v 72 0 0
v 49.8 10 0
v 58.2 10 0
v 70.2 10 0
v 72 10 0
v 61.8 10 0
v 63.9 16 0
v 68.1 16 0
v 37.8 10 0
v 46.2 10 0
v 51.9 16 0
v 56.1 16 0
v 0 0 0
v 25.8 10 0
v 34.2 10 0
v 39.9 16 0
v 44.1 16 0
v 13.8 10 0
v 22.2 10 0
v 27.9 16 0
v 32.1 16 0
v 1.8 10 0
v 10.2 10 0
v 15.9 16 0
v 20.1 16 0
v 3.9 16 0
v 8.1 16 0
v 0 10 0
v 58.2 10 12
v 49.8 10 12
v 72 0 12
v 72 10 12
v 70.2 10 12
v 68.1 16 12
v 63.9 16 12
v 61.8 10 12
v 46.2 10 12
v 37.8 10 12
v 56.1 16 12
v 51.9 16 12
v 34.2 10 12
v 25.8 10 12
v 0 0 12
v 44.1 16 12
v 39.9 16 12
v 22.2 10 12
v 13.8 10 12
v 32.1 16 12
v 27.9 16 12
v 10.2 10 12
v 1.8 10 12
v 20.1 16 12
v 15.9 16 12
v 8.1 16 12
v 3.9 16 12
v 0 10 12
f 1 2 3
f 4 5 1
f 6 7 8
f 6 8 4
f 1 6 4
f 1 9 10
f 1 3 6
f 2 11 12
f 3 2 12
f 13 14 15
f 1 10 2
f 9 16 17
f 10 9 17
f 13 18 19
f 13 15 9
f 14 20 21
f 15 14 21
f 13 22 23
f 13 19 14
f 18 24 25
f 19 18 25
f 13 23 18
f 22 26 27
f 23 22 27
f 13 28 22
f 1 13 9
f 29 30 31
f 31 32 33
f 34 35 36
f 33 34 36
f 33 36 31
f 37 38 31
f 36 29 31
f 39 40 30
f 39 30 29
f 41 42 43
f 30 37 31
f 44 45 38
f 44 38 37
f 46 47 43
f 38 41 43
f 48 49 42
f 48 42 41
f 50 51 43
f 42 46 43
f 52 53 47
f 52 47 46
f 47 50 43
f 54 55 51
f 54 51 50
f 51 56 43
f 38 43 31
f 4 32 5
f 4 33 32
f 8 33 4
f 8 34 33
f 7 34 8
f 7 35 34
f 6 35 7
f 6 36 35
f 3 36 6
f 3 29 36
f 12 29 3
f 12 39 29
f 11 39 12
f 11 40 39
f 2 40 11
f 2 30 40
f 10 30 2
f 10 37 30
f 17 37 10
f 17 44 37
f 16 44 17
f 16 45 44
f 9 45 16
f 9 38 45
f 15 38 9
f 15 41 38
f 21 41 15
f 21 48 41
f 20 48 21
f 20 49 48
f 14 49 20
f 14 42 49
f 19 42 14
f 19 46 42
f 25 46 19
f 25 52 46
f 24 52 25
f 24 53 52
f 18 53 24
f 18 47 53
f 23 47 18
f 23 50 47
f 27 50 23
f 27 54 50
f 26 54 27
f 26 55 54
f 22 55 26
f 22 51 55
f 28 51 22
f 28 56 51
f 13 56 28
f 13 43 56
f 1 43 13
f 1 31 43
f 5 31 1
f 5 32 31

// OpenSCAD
$fn = 32;

// ----------------------------------------------------------------------
// Gear rack: 6 teeth, pitch 12 mm
// ----------------------------------------------------------------------

// --- parameters (mm) ---
teeth = 6;                // number of teeth
pitch = 12;               // tooth pitch, X
root_w = 8.4;             // tooth width at the root
tip_w = 4.2;              // tooth width at the tip
base_h = 10;              // rack body height, Y
tooth_h = 6;              // tooth height above the body
plate_t = 12;             // rack width, Z (extrusion height)

rack_l = teeth * pitch;  // overall length
total_h = base_h + tooth_h;  // overall height

profile = [[0, 0], [72, 0], [72, 10], [70.2, 10], [68.1, 16], [63.9, 16], [61.8, 10], [58.2, 10], [56.1, 16], [51.9, 16], [49.8, 10], [46.2, 10], [44.1, 16], [39.9, 16], [37.8, 10], [34.2, 10], [32.1, 16], [27.9, 16], [25.8, 10], [22.2, 10], [20.1, 16], [15.9, 16], [13.8, 10], [10.2, 10], [8.1, 16], [3.9, 16], [1.8, 10], [0, 10]];  // primary outline, 28 points, counter clockwise

// --- the one profile operation ---
linear_extrude(height = plate_t) polygon(points = profile);
